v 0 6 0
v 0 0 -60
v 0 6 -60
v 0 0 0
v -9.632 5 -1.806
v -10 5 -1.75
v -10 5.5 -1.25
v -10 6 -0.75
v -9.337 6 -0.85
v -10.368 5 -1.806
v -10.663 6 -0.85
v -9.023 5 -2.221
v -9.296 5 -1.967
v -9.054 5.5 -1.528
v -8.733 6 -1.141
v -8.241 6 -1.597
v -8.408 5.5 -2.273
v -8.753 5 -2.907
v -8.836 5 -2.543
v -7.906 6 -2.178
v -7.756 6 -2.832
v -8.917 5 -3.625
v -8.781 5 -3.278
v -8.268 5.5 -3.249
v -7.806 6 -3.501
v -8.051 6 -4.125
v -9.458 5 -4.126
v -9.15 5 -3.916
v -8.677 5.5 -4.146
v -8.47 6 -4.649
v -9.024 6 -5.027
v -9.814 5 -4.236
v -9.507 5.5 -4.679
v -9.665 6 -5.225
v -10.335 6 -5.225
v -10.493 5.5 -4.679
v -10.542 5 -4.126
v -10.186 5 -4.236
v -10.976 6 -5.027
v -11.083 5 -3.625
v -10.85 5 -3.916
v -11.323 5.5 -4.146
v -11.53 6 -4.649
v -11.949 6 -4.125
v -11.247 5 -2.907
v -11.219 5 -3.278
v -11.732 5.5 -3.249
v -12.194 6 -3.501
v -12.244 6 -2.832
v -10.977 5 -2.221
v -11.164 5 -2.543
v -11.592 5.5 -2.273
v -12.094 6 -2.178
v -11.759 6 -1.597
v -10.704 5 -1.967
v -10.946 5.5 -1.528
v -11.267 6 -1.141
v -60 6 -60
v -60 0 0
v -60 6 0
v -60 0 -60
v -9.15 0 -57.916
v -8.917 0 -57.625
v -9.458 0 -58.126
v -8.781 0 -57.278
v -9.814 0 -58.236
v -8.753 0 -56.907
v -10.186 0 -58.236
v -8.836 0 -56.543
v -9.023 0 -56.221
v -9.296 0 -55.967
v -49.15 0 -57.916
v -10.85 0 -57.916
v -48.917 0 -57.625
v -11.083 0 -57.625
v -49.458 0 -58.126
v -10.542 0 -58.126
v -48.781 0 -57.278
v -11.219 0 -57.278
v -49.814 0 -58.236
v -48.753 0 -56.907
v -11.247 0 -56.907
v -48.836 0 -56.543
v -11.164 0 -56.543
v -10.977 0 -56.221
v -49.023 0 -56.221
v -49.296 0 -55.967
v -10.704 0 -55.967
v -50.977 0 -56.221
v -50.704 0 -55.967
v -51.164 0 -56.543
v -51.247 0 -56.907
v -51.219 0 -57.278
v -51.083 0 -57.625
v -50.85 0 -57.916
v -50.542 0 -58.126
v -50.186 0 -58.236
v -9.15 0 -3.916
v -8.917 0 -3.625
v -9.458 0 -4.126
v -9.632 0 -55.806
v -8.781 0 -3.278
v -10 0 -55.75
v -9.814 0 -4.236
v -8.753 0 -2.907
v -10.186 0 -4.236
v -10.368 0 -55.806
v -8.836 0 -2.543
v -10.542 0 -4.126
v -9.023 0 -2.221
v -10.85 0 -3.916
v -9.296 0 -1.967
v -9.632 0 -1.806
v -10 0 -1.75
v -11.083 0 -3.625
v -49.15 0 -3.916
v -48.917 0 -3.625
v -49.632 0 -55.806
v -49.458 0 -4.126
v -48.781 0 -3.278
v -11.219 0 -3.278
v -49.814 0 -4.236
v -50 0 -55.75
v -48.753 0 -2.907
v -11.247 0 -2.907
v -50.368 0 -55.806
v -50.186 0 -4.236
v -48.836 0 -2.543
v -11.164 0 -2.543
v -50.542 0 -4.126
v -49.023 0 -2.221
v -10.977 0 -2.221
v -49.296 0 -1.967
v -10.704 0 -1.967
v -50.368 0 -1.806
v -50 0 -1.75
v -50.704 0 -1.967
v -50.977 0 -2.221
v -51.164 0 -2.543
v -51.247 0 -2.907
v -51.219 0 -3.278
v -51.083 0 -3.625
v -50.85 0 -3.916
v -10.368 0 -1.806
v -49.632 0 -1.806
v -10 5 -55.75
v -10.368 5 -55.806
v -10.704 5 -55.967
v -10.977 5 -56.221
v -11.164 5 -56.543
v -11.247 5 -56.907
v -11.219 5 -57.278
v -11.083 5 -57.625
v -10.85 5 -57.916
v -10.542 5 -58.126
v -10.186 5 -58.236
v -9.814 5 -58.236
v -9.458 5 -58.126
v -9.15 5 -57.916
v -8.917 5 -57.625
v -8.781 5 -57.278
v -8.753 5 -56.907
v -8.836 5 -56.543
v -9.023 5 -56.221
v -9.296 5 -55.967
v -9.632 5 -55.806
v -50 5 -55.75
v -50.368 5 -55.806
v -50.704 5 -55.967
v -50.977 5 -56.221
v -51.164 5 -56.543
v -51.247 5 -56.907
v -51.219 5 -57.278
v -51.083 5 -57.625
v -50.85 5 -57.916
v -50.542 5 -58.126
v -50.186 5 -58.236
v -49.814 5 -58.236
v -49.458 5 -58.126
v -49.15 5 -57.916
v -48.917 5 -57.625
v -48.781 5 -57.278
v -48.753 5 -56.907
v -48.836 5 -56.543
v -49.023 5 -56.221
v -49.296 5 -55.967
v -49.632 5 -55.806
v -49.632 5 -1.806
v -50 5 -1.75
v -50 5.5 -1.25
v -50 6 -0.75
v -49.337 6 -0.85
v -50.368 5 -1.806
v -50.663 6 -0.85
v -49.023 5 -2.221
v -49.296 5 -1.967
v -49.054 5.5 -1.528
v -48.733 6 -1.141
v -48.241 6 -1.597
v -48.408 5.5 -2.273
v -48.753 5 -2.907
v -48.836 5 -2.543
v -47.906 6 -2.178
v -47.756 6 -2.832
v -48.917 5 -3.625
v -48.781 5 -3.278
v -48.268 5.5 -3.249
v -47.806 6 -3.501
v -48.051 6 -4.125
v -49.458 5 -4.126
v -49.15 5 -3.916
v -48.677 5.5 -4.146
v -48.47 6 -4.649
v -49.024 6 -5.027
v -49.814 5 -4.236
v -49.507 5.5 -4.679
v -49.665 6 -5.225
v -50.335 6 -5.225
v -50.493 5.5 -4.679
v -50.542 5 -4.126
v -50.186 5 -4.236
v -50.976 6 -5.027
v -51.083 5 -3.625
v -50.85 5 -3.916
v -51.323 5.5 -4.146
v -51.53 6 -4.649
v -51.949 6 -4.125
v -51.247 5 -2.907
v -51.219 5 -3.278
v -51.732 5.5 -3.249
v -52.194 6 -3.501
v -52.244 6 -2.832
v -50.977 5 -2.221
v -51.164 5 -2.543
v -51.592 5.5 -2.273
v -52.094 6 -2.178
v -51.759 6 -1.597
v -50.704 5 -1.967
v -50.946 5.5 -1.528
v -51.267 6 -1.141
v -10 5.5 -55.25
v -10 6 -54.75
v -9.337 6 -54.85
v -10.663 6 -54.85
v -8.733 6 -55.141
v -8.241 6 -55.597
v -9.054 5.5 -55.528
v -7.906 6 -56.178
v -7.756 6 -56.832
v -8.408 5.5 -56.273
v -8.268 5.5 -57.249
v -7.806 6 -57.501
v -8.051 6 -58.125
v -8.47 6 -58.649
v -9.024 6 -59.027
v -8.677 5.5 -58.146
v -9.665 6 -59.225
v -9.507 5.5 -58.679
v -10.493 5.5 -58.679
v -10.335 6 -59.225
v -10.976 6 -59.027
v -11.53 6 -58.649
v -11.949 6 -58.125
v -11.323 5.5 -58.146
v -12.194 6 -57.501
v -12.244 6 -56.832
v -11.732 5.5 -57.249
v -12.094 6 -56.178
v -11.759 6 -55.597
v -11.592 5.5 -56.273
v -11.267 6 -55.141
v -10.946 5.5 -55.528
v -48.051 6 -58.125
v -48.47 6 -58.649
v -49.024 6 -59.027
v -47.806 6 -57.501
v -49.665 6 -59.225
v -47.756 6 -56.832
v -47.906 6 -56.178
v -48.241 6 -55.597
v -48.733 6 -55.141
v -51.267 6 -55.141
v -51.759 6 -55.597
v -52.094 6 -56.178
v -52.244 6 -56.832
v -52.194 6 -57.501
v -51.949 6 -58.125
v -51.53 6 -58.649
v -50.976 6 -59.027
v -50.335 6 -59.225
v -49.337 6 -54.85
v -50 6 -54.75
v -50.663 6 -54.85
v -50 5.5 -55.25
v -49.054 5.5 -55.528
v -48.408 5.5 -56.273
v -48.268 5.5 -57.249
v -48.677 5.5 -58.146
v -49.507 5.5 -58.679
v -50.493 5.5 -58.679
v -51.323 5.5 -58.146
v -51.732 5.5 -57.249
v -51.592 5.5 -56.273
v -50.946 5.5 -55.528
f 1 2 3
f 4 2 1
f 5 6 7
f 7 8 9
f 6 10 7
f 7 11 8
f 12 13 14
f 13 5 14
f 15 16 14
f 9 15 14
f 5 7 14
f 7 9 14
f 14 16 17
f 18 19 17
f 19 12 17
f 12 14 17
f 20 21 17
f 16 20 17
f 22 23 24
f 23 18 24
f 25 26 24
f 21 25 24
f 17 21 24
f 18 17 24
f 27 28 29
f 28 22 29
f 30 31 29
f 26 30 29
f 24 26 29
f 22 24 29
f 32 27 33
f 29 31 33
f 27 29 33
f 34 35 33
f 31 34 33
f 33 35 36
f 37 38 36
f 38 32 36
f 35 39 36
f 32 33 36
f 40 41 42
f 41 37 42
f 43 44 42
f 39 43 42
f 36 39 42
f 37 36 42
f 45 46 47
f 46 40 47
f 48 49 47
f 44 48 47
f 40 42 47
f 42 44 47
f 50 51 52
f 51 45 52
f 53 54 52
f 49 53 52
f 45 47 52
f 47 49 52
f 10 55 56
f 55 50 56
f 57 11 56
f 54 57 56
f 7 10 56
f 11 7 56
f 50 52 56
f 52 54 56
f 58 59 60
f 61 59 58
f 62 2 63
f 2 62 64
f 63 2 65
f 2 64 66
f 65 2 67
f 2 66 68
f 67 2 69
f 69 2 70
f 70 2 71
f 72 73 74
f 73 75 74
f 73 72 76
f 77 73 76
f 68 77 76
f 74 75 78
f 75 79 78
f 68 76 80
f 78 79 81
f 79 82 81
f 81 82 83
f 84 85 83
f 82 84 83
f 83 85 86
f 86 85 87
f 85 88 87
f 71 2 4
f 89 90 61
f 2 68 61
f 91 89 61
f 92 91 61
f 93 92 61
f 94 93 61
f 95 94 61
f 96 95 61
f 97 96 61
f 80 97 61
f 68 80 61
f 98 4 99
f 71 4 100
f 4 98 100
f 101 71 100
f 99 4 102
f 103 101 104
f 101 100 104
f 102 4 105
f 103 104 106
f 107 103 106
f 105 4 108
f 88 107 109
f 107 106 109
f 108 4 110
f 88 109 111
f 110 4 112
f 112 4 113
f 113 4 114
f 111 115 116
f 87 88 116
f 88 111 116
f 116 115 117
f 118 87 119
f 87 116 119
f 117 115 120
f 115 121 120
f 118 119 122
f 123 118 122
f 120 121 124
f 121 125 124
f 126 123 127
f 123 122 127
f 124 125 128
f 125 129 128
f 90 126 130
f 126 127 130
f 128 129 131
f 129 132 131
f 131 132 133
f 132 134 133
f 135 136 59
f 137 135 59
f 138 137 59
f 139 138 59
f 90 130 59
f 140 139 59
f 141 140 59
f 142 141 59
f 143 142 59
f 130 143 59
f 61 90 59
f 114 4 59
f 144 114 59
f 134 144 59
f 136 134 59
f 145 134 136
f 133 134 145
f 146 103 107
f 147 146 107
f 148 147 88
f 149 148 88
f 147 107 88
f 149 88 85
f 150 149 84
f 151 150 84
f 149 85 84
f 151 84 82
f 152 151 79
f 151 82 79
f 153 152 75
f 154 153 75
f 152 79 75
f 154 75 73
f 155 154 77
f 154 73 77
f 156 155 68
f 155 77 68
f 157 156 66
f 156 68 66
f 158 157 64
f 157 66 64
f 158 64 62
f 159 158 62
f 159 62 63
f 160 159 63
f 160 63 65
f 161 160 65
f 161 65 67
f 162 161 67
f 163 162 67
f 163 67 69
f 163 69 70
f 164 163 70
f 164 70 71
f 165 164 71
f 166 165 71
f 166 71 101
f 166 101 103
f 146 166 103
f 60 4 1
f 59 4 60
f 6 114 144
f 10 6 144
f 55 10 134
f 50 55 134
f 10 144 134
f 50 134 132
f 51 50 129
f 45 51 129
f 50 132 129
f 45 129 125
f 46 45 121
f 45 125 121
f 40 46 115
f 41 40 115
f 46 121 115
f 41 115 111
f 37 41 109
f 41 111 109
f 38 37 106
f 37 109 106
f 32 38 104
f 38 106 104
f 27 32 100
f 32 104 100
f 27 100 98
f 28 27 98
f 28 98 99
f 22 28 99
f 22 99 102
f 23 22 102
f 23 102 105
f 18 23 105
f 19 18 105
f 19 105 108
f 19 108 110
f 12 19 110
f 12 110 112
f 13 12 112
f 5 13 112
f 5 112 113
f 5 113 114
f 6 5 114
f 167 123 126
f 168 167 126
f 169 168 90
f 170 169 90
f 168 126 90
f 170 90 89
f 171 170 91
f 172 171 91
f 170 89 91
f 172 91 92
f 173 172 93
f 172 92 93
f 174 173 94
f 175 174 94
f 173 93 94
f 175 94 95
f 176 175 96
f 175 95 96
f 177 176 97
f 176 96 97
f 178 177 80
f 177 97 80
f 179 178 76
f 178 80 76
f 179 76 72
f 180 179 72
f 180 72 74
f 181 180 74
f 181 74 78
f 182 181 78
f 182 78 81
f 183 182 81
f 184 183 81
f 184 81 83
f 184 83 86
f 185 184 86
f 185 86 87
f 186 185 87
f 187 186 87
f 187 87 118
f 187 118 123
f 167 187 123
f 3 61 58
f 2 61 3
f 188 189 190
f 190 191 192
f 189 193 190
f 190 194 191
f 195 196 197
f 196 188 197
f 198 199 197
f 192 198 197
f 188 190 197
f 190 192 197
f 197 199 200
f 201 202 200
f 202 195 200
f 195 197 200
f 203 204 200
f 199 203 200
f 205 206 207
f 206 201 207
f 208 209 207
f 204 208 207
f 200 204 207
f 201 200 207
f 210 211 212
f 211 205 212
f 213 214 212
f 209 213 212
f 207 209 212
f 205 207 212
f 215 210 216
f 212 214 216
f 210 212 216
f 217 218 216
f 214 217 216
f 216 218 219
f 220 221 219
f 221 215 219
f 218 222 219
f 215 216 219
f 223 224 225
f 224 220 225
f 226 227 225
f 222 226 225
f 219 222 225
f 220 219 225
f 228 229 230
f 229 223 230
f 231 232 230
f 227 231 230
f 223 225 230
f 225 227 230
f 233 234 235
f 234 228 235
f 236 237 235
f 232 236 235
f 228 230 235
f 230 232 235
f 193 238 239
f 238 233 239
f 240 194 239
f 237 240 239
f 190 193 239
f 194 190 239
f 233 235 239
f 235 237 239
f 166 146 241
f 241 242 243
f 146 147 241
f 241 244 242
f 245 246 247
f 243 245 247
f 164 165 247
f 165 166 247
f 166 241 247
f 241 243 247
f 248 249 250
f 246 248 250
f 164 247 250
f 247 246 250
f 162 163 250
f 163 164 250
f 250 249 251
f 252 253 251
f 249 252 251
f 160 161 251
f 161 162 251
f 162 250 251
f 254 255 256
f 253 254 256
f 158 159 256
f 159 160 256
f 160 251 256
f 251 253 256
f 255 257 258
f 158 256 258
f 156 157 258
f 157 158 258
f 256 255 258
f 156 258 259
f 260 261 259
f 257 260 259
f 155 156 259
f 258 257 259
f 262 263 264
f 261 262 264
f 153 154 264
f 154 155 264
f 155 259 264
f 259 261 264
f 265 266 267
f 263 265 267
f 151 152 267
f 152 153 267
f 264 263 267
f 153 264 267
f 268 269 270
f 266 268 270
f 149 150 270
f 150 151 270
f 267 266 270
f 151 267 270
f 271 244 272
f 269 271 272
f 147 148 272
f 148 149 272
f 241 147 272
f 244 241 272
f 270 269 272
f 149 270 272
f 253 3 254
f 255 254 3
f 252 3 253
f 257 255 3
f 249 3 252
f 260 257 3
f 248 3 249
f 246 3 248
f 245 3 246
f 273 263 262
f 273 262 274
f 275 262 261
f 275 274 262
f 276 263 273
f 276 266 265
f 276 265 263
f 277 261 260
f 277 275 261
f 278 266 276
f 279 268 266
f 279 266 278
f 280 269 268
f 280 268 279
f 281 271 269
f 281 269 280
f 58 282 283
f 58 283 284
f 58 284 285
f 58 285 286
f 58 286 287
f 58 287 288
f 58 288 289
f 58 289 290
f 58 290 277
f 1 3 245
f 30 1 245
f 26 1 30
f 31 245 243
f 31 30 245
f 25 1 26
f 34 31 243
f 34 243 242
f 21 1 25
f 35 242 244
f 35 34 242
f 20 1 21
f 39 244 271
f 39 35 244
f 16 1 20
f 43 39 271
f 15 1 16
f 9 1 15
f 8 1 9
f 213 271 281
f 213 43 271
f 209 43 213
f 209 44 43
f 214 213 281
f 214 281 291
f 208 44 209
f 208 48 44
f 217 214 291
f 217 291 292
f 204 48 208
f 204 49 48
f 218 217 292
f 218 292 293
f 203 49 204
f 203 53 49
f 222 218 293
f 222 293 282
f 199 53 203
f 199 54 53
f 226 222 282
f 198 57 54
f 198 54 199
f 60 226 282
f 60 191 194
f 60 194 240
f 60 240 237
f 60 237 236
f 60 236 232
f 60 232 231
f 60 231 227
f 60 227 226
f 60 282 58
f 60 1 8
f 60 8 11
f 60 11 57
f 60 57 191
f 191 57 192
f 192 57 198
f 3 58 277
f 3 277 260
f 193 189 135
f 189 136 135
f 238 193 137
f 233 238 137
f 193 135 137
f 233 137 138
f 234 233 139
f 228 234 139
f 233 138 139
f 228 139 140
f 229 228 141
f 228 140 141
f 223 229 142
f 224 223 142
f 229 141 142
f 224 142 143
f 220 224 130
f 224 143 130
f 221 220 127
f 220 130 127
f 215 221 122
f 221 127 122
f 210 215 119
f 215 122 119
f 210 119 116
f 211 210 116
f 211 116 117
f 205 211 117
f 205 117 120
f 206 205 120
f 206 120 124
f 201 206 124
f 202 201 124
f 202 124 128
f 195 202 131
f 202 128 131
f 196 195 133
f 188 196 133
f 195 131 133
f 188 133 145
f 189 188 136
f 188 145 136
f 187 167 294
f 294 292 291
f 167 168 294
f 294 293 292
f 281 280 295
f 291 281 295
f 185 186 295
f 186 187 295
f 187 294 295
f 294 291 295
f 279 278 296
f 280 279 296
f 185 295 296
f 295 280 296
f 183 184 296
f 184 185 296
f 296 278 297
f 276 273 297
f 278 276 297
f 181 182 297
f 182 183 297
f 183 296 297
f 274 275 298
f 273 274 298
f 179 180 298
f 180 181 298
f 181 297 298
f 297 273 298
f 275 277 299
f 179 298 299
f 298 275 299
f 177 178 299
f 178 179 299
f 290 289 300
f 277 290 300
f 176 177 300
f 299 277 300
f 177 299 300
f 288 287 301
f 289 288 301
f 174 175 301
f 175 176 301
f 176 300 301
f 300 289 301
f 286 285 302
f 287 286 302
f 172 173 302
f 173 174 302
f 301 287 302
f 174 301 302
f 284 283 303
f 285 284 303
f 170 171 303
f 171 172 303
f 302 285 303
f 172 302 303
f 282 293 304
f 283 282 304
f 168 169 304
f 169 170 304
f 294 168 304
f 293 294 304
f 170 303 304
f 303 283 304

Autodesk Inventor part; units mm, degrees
ref_plane "YZ Plane" through (0, 0, 0) normal (1, 0, 0) x (0, 1, 0)
ref_plane "XZ Plane" through (0, 0, 0) normal (0, 1, 0) x (-1, 0, 0)
ref_plane "XY Plane" through (0, 0, 0) normal (0, 0, 1) x (1, 0, 0)
sketch "Skizze1" plane through (0, 0, 0) normal (0, 1, 0) x (-1, 0, 0)
  line L0 (0, 0) -> (60, 0)
  line L1 (60, 0) -> (60, -60)
  line L2 (60, -60) -> (0, -60)
  line L3 (0, -60) -> (0, 0)
  dimension "d0" = 60
  dimension "d1" = 60
extrude "Extrusion1" add sketch "Skizze1" along normal blind 6
sketch "m" plane through (0, 6, 0) normal (0, 1, 0) x (1, 0, 0)
  line L0 (-60, 0) -> (0, 0) projected
  line L1 (-60, 60) -> (-60, 0) projected
  line L2 (0, 0) -> (0, 60) projected
  line L3 (0, 60) -> (-60, 60) projected
  point P0 (-50, 3)
  point P1 (-10, 3)
  point P2 (-50, 57)
  point P3 (-10, 57)
  dimension "d4" = 3
  dimension "d5" = 10
  dimension "d6" = 10
  dimension "d7" = 3
hole "Bohrung1" at (-50, 6, -3) at (-10, 6, -3) at (-50, 6, -57) at (-10, 6, -57) direction (0, -1, 0) diameter 2.5 depth 10 tip angle 118
chamfer "Fase1" distance 1 angle 45 4 edges at (-10, 6, -58.25) (-50, 6, -58.25) (-10, 6, -4.25) (-50, 6, -4.25)
properties part number "AkkuHaltBoden"
